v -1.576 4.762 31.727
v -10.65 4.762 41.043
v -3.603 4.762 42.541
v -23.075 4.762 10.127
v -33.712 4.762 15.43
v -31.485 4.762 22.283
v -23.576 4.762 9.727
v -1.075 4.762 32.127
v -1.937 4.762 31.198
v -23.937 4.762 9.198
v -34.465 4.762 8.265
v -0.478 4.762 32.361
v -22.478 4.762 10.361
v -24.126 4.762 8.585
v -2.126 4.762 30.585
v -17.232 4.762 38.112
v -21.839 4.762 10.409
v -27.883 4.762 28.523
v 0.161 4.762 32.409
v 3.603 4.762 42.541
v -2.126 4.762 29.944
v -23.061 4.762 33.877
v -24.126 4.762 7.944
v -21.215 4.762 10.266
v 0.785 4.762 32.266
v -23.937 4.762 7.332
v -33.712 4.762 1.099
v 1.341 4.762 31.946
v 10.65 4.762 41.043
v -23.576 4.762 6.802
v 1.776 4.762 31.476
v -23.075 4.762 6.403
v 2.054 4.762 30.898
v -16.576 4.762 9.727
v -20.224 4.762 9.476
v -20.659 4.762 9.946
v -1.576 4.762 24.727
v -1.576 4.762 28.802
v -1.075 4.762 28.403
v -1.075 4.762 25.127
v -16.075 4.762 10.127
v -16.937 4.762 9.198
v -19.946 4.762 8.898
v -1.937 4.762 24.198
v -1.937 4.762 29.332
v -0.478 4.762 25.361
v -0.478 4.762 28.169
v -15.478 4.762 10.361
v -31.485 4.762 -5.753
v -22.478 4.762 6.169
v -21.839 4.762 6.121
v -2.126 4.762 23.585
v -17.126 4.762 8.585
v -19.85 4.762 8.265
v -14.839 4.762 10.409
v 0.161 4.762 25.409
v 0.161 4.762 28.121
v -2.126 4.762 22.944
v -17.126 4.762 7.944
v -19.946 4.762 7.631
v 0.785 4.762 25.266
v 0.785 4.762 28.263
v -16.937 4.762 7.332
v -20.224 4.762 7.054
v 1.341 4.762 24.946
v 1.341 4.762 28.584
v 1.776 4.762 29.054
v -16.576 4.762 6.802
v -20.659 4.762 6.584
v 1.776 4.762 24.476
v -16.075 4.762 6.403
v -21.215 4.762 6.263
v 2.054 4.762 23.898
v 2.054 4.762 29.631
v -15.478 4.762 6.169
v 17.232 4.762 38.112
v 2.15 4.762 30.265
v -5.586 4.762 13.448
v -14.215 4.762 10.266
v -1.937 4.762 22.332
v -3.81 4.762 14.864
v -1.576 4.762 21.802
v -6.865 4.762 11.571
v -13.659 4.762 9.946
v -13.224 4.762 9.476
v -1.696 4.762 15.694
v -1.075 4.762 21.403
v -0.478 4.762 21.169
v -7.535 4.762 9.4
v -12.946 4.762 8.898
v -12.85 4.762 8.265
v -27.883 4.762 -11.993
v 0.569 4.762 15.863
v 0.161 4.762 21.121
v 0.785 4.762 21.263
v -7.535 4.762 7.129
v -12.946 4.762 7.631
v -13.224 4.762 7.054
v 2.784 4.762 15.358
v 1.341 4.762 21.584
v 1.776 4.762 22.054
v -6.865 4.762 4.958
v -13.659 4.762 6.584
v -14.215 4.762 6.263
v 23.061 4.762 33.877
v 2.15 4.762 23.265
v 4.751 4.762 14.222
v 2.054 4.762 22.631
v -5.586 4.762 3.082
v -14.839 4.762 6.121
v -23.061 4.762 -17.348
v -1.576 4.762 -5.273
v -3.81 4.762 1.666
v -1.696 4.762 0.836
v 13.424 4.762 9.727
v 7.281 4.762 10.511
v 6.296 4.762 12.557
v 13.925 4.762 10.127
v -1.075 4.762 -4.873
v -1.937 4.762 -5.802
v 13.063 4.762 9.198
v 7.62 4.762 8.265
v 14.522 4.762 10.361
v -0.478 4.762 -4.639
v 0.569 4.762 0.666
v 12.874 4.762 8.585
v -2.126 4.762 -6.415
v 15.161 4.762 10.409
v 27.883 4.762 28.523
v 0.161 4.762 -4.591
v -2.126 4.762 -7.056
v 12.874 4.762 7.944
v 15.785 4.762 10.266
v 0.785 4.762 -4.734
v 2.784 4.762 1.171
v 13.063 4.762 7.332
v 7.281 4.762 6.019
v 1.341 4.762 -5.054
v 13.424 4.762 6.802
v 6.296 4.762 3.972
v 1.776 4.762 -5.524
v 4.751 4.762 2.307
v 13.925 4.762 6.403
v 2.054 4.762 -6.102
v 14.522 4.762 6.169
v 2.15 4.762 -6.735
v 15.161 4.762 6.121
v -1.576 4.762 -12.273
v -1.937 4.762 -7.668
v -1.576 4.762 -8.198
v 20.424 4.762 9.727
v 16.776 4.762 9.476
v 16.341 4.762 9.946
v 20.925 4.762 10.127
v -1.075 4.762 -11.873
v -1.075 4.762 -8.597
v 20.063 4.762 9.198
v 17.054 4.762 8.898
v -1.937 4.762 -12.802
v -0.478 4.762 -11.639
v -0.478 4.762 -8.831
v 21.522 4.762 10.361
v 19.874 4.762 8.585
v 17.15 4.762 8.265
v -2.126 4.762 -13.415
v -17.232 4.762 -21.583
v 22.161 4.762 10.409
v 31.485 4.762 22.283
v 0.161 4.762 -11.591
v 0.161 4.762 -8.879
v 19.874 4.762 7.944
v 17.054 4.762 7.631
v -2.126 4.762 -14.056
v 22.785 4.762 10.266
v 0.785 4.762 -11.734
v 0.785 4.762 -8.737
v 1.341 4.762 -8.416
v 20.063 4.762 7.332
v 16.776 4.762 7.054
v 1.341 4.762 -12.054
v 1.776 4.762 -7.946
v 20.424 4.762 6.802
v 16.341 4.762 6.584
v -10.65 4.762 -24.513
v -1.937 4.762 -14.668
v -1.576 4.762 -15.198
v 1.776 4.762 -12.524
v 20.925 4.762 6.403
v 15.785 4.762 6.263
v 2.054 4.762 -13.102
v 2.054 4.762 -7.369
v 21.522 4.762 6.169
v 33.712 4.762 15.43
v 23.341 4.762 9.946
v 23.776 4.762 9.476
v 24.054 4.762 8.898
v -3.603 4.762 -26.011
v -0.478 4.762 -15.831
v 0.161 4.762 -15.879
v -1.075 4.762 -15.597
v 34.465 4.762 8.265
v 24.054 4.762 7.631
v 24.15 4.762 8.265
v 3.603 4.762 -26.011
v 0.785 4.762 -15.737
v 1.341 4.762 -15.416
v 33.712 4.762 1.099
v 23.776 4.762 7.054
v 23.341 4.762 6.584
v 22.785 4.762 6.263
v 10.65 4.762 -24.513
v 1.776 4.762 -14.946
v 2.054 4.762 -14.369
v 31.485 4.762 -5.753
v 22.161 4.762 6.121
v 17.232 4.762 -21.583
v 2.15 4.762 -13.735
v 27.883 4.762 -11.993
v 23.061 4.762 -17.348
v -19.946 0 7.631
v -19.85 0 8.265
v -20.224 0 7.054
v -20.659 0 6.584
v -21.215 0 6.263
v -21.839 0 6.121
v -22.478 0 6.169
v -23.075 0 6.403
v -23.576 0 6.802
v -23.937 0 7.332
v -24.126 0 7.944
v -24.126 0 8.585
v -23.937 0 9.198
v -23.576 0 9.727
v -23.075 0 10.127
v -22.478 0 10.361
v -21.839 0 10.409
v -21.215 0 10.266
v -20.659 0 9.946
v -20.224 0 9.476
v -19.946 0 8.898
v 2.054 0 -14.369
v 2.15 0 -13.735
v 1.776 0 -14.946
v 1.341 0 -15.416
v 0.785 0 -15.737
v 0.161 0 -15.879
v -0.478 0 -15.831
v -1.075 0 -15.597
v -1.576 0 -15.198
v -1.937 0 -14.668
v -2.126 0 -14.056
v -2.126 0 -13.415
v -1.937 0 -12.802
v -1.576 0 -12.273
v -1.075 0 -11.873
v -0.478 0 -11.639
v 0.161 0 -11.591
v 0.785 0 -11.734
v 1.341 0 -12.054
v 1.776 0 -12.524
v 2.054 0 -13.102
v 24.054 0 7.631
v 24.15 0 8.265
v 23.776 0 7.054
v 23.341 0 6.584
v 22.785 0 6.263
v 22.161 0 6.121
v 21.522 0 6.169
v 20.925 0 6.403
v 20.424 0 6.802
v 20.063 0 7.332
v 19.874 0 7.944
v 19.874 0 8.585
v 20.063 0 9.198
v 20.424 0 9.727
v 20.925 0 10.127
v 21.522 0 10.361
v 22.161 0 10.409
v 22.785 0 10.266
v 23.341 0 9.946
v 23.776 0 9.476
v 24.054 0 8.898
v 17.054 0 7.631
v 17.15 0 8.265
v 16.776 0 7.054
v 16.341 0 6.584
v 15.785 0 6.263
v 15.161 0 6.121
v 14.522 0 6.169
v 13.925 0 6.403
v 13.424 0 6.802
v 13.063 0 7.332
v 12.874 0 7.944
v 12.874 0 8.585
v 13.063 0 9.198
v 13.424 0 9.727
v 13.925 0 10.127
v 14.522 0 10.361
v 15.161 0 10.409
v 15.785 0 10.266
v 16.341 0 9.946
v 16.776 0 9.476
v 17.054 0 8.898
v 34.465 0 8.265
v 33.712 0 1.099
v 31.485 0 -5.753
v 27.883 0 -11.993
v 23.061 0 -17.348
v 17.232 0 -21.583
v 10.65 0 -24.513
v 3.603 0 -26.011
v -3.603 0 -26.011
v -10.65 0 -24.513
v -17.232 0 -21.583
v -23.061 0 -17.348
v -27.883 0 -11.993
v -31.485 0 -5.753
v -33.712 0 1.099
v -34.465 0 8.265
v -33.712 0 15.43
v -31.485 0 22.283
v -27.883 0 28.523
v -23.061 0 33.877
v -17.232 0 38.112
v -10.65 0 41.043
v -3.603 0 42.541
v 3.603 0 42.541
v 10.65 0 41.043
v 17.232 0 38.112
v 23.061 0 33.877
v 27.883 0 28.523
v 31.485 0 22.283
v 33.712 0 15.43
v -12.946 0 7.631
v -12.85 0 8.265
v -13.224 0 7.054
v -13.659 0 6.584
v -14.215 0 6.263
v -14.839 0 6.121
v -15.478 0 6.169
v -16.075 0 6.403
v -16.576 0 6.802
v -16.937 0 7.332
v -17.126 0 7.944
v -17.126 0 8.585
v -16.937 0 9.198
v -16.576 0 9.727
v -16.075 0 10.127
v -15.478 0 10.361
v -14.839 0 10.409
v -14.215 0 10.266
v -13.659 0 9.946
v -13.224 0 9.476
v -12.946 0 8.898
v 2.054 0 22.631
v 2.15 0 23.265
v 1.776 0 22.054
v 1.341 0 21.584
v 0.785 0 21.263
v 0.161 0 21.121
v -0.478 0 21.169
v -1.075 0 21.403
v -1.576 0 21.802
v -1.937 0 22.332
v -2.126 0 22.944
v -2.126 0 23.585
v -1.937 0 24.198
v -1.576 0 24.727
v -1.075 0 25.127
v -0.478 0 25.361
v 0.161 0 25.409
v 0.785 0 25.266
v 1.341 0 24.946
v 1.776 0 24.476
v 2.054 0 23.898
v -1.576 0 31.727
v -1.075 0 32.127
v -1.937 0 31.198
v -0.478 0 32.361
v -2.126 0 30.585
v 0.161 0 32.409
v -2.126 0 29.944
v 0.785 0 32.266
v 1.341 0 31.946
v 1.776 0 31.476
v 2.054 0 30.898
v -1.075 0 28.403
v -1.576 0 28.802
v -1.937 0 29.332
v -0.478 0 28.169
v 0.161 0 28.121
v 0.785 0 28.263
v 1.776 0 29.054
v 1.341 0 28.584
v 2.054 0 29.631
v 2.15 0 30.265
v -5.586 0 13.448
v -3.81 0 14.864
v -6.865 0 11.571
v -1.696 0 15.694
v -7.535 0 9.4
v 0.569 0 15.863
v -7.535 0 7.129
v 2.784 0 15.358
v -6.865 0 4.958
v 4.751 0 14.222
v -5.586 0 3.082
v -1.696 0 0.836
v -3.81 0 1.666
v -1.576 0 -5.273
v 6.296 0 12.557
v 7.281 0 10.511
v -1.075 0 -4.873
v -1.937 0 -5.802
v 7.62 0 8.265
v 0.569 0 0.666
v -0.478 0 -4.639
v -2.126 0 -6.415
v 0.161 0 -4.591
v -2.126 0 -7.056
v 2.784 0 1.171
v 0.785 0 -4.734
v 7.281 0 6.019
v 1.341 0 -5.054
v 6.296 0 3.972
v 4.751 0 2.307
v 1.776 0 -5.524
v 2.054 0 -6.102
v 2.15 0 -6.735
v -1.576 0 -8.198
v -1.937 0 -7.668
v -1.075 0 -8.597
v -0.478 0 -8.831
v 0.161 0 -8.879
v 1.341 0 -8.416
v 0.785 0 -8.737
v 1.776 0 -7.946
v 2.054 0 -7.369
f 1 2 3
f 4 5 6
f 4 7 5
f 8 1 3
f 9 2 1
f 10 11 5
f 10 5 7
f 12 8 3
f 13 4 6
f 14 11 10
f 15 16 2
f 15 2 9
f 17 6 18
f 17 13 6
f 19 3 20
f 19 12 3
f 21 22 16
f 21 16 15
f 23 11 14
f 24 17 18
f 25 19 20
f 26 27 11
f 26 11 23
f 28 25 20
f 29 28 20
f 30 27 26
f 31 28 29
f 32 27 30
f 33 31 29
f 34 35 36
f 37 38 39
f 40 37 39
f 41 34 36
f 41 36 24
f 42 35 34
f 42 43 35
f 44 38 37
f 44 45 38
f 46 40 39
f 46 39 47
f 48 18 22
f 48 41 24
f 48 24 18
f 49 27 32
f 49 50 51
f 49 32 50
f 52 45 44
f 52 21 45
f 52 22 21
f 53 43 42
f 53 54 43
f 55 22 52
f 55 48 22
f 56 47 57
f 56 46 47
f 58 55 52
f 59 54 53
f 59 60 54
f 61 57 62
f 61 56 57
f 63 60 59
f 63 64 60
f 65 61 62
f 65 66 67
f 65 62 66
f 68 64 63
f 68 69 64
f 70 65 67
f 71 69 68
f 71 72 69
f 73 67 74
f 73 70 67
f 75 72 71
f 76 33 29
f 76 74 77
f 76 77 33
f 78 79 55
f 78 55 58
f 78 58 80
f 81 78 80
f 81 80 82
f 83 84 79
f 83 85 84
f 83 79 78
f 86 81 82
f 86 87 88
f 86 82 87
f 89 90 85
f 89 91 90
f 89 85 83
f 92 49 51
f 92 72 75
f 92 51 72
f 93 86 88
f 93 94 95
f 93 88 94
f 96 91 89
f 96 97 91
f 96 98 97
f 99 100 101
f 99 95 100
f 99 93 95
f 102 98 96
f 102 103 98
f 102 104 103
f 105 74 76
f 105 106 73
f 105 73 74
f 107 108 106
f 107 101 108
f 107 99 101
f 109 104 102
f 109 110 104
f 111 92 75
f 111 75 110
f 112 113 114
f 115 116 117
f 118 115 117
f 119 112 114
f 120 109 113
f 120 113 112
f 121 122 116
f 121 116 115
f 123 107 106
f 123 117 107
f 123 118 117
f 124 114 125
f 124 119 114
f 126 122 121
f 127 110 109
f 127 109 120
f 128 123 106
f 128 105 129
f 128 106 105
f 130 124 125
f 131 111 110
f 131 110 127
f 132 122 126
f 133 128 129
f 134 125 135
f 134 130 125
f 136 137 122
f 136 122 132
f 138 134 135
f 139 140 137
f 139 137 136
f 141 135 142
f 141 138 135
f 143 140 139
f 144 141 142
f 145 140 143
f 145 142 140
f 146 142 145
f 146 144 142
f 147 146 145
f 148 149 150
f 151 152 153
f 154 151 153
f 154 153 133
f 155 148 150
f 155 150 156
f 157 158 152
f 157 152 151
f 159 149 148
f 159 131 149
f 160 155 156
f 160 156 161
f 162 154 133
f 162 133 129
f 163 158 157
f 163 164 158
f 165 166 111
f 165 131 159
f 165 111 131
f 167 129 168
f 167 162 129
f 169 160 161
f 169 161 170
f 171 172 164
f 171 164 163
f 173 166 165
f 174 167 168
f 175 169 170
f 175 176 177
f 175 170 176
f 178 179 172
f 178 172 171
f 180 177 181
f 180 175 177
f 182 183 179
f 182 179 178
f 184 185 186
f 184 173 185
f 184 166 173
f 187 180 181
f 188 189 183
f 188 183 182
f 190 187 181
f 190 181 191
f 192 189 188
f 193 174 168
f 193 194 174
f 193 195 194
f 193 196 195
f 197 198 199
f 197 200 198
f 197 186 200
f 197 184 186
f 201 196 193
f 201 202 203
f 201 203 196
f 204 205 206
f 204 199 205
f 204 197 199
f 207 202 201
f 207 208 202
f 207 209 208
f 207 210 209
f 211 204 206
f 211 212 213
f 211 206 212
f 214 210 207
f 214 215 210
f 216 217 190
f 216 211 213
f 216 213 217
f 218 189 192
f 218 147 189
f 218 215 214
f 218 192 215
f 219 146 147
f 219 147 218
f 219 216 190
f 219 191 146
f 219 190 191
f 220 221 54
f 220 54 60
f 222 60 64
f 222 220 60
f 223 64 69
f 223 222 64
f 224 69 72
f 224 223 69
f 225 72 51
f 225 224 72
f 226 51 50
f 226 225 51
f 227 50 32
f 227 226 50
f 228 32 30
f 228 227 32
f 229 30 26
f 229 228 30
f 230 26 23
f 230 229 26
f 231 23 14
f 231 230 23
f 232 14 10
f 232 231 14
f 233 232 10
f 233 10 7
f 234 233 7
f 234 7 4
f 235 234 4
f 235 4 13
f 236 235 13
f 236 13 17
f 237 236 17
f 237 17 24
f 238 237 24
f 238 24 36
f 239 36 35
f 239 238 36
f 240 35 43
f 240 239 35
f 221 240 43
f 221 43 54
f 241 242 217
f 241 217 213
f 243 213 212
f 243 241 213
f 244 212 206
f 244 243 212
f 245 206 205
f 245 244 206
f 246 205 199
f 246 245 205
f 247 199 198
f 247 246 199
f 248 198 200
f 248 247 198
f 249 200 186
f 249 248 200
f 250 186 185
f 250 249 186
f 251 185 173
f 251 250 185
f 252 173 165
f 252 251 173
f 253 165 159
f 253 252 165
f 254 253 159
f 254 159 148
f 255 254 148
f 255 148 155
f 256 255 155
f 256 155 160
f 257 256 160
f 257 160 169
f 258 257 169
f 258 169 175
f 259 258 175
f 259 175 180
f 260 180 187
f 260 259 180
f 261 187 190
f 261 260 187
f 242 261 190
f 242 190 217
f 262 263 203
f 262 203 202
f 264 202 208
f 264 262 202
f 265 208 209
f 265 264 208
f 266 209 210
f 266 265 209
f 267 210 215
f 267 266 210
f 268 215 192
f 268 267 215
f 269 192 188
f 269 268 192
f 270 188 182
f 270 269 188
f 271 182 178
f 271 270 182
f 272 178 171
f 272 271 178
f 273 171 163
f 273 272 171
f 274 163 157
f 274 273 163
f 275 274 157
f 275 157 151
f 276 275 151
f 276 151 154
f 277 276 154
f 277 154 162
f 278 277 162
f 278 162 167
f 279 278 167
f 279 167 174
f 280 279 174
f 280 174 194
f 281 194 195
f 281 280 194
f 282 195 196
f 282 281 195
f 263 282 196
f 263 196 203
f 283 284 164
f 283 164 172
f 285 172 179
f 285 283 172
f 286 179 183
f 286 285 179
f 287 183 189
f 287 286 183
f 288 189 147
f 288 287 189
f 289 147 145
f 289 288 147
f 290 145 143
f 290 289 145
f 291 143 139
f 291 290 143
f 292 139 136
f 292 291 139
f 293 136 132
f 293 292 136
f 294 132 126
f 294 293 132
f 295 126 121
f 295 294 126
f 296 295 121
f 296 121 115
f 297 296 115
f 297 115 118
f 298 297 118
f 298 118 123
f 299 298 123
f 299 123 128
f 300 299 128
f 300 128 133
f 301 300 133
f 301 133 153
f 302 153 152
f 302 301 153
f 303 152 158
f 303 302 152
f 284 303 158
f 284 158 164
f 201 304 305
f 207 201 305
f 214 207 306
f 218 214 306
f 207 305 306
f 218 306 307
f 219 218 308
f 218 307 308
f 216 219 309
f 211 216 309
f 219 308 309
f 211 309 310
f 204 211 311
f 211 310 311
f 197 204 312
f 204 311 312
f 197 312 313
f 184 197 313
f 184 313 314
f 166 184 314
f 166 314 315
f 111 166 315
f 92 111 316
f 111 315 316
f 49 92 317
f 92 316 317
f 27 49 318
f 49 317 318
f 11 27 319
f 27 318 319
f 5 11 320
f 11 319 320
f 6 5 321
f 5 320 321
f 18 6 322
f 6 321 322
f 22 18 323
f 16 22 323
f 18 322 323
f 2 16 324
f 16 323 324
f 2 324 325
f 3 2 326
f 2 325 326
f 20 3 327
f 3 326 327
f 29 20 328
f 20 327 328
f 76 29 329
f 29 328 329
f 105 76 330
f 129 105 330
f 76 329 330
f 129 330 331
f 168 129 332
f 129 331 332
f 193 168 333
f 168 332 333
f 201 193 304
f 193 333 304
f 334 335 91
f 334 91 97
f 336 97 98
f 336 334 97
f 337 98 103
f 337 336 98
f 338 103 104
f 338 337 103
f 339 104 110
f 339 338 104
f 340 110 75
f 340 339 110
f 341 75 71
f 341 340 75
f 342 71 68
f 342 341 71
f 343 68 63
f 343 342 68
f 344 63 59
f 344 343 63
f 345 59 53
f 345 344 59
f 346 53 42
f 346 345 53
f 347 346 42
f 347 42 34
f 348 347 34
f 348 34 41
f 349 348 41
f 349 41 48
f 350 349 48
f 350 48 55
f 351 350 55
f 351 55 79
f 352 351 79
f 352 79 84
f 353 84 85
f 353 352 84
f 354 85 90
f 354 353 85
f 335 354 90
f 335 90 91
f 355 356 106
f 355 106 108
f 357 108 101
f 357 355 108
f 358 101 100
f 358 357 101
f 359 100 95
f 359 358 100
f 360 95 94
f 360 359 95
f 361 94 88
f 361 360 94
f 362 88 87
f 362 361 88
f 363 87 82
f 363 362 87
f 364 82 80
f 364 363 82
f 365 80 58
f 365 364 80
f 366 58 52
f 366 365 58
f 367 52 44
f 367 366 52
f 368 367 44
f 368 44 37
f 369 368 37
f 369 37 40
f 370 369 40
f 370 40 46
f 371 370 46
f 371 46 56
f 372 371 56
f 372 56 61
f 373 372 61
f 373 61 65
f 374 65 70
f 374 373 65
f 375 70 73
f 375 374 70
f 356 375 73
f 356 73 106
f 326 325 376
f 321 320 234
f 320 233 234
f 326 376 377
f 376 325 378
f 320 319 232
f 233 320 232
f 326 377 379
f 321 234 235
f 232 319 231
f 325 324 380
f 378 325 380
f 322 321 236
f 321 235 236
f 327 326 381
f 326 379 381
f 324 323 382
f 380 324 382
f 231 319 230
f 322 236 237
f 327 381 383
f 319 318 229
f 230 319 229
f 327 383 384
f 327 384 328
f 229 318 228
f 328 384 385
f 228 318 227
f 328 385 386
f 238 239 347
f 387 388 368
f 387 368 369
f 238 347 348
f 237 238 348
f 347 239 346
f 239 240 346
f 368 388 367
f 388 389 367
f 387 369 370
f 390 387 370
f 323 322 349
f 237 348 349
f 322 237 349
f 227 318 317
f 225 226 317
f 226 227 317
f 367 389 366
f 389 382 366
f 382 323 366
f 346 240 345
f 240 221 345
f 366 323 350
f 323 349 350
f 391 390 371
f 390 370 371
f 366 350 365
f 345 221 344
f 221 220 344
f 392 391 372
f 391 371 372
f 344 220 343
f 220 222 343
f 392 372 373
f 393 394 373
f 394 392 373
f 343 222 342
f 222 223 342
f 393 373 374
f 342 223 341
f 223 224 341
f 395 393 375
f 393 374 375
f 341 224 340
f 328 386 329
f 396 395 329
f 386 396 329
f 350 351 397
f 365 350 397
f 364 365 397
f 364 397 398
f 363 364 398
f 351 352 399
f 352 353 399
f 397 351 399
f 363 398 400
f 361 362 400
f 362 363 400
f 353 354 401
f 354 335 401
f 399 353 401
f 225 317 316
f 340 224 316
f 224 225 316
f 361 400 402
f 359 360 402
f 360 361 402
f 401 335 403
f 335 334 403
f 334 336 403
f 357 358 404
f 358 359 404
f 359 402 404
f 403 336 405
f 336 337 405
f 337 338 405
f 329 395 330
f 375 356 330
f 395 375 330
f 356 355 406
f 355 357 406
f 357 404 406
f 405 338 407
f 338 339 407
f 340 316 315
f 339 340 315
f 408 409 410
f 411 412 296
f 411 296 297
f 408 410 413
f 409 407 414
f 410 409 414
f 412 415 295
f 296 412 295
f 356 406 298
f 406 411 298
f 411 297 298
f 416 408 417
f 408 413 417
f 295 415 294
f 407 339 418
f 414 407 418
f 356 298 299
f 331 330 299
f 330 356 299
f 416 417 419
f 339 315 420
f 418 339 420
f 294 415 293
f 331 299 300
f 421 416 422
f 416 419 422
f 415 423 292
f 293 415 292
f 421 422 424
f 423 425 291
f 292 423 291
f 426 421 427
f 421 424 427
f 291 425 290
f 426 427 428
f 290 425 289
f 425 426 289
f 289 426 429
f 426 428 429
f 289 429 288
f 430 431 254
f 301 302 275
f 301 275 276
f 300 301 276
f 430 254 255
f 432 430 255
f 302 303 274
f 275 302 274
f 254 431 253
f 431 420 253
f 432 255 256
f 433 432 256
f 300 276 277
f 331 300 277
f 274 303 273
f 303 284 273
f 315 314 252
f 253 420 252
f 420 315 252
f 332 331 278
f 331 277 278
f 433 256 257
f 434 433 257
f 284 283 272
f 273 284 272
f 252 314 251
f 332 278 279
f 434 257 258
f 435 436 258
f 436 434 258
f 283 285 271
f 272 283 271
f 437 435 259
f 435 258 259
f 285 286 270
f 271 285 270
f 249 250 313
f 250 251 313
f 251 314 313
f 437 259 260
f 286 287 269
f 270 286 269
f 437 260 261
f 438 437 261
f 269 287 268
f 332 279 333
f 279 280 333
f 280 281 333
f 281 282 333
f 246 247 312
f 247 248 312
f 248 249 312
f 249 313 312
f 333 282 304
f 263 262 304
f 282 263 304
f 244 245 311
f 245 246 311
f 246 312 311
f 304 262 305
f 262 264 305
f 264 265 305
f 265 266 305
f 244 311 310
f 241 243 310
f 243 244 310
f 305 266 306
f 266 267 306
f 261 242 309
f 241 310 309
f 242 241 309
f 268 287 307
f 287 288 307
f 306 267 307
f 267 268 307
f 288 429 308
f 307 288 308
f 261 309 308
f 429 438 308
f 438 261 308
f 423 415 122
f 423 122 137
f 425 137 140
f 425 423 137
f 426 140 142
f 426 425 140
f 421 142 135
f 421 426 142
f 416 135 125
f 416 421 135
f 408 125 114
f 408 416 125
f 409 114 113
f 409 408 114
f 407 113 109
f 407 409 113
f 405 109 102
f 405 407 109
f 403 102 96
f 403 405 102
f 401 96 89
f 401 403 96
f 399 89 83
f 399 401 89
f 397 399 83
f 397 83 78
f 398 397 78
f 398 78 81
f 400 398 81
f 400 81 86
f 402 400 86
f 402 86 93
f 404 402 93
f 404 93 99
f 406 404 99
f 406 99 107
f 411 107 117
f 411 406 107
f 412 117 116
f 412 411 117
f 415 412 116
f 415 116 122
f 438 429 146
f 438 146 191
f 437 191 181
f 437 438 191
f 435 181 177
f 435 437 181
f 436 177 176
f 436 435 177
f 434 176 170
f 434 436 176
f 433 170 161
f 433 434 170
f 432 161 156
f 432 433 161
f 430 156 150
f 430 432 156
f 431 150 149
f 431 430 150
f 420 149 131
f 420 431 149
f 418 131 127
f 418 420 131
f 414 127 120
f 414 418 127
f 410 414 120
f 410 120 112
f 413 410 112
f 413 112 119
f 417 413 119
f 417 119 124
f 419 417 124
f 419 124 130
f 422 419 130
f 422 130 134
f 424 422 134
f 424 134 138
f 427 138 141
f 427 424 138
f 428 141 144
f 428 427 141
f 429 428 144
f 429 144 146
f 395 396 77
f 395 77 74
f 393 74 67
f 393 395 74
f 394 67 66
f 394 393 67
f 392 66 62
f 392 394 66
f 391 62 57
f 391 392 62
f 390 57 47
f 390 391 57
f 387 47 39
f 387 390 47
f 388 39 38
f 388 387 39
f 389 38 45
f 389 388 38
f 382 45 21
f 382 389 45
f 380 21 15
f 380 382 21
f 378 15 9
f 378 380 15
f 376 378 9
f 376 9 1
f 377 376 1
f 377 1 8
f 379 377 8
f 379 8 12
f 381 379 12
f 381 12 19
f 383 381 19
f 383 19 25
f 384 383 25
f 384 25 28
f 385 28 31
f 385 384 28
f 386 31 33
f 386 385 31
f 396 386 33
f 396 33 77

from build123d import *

# Parameters (mm, degrees)
SKETCH1_R           = 34.464858416
SKETCH1_R_2         = 2.15
SKETCH1_R_3         = 7.62
BOSS_EXTRUDE1_DEPTH = 4.7625


with BuildPart() as part:
    # Sketch1 → Boss-Extrude1 (new body)
    with BuildSketch(Plane(origin=(0, 0, 0), x_dir=(1, 0, 0), z_dir=(0, 1, 0))):
        with Locations((0, -8.264651725)):
            Circle(SKETCH1_R)
        with Locations((15, -8.264651725)):
            Circle(SKETCH1_R_2, mode=Mode.SUBTRACT)
        with Locations((22, -8.264651725)):
            Circle(SKETCH1_R_2, mode=Mode.SUBTRACT)
        with Locations((0, -23.264651725)):
            Circle(SKETCH1_R_2, mode=Mode.SUBTRACT)
        with Locations((0, -30.264651725)):
            Circle(SKETCH1_R_2, mode=Mode.SUBTRACT)
        with Locations((-15, -8.264651725)):
            Circle(SKETCH1_R_2, mode=Mode.SUBTRACT)
        with Locations((-22, -8.264651725)):
            Circle(SKETCH1_R_2, mode=Mode.SUBTRACT)
        with Locations((0, 6.735348275)):
            Circle(SKETCH1_R_2, mode=Mode.SUBTRACT)
        with Locations((0, 13.735348275)):
            Circle(SKETCH1_R_2, mode=Mode.SUBTRACT)
        with Locations((0, -8.264651725)):
            Circle(SKETCH1_R_3, mode=Mode.SUBTRACT)
    extrude(amount=BOSS_EXTRUDE1_DEPTH)


solid = part.part
